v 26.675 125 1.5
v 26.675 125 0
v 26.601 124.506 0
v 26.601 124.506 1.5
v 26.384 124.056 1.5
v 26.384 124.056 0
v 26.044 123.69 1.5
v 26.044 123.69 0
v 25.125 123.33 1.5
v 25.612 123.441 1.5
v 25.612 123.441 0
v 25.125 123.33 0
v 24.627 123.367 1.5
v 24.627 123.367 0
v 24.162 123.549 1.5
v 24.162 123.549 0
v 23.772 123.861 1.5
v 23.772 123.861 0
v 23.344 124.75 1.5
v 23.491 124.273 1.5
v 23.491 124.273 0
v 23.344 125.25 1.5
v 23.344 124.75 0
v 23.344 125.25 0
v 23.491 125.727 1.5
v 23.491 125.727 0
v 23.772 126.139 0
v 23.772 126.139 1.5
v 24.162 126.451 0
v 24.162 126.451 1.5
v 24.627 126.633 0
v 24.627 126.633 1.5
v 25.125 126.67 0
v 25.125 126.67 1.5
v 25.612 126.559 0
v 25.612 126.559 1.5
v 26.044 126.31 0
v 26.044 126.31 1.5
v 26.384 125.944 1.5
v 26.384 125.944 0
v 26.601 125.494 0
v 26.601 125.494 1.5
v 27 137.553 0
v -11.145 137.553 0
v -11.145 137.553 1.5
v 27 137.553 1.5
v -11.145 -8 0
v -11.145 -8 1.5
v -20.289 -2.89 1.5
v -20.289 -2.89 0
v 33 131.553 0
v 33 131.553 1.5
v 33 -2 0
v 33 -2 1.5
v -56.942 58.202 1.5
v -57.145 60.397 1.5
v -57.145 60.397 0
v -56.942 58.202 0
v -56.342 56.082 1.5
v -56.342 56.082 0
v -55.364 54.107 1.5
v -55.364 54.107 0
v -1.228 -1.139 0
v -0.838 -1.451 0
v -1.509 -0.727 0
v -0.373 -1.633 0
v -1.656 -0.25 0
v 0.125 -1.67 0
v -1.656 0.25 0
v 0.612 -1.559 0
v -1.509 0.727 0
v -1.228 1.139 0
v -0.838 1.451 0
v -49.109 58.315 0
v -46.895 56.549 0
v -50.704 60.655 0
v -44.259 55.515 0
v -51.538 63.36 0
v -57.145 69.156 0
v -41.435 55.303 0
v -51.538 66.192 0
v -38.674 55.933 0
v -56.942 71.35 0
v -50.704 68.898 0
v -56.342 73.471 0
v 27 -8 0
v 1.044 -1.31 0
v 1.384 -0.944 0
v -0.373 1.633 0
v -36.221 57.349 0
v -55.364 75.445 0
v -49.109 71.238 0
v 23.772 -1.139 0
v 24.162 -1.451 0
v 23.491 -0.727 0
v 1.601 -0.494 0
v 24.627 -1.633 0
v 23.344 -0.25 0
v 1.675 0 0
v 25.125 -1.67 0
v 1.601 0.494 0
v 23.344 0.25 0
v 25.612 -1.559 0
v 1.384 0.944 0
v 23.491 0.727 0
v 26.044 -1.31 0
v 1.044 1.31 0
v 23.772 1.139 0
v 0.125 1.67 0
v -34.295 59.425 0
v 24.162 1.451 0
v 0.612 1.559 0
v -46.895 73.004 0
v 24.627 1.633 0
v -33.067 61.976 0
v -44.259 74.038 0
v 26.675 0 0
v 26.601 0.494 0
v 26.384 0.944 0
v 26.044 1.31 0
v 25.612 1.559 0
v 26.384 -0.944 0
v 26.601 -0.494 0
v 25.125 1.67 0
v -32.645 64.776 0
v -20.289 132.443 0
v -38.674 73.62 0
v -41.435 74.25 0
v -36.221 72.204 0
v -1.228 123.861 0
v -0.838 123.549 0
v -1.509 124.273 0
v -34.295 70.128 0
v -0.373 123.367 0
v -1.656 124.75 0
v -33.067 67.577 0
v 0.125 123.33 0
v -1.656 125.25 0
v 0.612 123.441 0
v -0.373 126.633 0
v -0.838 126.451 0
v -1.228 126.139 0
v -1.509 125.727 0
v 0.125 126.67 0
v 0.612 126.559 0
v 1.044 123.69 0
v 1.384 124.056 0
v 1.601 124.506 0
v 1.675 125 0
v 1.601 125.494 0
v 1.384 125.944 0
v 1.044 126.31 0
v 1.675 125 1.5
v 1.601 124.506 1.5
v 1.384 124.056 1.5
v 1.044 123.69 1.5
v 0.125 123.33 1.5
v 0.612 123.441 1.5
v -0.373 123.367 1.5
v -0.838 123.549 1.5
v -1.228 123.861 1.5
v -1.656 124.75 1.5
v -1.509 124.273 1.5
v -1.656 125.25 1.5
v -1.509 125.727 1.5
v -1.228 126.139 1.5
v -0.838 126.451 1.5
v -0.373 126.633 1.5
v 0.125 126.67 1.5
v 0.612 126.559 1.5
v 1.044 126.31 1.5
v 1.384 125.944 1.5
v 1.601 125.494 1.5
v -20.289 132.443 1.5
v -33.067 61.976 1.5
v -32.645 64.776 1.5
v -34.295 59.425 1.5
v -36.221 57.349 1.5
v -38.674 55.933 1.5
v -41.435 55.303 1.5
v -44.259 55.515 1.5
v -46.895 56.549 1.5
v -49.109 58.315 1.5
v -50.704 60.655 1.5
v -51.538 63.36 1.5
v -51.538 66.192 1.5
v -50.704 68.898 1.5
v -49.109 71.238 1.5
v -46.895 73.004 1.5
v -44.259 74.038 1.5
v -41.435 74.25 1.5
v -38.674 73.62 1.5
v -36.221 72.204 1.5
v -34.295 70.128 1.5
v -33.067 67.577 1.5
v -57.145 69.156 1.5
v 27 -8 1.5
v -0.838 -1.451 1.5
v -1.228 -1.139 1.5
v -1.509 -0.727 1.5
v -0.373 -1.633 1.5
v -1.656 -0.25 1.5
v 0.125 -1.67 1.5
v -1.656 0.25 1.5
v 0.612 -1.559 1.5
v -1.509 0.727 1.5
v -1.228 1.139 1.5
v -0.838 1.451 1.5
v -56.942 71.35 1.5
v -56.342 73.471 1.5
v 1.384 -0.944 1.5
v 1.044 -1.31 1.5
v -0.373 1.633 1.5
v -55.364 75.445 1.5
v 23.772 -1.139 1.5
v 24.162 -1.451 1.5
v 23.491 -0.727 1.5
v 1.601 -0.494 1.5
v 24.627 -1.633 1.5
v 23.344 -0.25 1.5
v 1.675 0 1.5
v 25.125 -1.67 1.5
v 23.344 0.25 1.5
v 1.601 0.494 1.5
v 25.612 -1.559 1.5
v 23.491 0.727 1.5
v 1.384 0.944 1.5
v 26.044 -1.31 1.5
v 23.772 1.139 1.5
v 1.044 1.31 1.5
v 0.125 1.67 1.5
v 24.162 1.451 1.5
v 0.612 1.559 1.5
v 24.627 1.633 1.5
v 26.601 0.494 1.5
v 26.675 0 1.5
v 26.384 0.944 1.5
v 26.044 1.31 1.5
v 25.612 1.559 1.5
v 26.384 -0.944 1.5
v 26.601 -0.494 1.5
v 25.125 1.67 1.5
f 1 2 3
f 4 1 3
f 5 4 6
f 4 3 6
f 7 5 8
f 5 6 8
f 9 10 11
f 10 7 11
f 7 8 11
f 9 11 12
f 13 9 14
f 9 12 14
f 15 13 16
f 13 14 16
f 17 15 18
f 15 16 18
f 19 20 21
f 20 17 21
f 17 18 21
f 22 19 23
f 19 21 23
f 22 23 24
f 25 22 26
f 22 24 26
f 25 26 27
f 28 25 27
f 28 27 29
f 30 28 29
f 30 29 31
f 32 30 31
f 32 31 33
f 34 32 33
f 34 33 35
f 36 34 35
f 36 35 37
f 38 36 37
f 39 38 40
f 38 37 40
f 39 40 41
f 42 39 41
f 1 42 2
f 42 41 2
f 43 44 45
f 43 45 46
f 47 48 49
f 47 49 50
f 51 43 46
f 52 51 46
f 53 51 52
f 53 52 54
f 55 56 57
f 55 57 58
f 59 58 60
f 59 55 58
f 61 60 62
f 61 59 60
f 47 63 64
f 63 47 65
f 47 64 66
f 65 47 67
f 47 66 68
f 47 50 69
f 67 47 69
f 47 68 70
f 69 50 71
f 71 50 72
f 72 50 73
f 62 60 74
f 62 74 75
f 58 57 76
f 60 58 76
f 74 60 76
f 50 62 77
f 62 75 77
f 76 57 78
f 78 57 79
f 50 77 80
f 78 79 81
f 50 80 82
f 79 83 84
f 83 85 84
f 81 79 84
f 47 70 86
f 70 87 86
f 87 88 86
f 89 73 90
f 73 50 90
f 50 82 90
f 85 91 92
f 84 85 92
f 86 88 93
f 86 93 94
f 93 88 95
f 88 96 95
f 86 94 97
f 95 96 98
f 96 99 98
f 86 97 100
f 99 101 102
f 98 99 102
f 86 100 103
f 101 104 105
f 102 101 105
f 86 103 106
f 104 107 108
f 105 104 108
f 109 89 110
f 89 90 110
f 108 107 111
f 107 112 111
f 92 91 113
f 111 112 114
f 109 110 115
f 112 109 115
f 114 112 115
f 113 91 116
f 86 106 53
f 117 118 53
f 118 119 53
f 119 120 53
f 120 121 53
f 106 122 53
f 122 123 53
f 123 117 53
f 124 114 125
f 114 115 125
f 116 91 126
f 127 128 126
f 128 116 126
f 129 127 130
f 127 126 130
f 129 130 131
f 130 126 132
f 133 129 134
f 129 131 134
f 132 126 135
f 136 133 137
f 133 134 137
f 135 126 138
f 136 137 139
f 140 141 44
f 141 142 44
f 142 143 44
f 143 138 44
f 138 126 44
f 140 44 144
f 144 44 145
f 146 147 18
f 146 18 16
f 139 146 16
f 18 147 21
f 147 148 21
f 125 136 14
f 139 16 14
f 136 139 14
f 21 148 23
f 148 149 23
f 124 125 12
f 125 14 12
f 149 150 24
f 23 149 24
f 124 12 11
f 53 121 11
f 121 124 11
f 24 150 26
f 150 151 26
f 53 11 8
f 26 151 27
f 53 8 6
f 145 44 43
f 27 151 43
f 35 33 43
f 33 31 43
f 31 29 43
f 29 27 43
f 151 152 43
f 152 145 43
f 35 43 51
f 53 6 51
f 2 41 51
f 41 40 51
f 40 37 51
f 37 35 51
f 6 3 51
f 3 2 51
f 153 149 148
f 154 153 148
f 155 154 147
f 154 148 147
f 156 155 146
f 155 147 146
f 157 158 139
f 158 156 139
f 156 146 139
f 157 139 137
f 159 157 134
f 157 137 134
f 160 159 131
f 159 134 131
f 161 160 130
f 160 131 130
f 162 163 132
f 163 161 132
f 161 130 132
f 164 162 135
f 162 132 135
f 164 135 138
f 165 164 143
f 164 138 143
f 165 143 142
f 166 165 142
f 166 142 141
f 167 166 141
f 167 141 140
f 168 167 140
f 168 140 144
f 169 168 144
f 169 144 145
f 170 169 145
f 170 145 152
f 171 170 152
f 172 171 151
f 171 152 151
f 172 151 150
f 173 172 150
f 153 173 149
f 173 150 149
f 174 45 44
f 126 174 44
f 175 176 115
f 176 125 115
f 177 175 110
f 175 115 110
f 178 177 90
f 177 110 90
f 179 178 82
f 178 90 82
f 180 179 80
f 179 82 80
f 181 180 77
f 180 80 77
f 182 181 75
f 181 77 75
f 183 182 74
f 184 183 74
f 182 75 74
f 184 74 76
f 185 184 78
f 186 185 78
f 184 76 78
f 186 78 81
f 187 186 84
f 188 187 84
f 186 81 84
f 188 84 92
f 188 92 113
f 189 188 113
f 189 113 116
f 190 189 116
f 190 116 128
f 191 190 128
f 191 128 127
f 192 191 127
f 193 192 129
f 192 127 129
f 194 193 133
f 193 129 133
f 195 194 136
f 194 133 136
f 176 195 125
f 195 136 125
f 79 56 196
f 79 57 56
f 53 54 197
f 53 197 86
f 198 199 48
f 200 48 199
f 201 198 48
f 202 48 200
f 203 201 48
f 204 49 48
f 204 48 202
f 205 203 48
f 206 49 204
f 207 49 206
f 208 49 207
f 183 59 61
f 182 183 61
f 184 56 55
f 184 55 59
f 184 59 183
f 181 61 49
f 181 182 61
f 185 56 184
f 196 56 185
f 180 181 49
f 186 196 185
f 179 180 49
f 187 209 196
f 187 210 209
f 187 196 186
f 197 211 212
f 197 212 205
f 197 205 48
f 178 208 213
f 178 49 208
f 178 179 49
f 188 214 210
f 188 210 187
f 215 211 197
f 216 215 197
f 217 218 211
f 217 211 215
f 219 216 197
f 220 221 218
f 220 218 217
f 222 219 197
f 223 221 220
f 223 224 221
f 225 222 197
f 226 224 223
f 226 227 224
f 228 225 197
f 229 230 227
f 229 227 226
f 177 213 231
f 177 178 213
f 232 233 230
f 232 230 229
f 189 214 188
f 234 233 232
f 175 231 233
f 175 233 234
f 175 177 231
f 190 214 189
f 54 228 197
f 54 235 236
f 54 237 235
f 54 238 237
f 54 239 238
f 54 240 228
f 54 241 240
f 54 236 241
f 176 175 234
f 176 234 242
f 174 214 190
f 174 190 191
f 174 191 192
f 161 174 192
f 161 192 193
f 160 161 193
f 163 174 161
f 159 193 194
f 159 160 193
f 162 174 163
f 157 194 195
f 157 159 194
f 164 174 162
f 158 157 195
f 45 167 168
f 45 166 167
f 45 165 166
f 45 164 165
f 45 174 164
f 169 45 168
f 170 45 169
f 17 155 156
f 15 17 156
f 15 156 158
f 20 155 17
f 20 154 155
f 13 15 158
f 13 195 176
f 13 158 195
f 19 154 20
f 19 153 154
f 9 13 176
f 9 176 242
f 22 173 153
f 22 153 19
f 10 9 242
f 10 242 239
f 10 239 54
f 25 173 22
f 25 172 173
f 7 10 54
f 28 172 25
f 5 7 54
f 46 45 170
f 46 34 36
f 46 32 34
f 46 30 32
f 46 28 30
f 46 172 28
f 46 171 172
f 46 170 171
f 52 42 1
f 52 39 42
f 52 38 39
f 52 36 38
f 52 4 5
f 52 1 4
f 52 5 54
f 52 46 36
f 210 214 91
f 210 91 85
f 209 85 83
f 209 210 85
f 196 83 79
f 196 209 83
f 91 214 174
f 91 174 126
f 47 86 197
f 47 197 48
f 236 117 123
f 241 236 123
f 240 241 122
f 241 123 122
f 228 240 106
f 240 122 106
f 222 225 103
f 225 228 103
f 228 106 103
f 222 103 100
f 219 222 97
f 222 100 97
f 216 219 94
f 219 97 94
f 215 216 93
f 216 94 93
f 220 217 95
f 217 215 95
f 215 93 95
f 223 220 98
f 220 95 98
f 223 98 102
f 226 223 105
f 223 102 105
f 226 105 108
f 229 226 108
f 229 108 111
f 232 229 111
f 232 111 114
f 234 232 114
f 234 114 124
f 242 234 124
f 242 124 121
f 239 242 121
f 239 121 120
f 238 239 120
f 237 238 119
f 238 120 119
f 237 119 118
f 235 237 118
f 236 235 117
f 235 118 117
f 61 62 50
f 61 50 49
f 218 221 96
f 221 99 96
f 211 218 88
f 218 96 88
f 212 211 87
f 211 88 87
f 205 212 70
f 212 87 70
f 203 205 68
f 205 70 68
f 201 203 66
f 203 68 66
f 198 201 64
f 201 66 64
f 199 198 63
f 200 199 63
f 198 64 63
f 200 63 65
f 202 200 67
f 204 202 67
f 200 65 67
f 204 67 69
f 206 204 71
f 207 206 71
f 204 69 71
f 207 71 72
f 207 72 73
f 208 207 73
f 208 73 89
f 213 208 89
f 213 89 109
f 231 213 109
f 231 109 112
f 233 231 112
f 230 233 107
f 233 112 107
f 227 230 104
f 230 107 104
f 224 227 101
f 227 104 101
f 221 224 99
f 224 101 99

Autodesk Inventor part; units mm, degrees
ref_plane "YZ Plane" through (0, 0, 0) normal (1, 0, 0) x (0, 1, 0)
ref_plane "XZ Plane" through (0, 0, 0) normal (0, 1, 0) x (-1, 0, 0)
ref_plane "XY Plane" through (0, 0, 0) normal (0, 0, 1) x (1, 0, 0)
sketch "Sketch1" plane through (0, 0, 0) normal (0, 0, 1) x (1, 0, 0)
  circle A0 centre (0, 0) radius 1.675
  circle A1 centre (25, 0) radius 1.675
  line L0 (0, 0) -> (0, 1.675)
  circle A2 centre (0, 125) radius 1.675
  circle A3 centre (25, 125) radius 1.675
  line L1 (33, -8) -> (-57.1446, -8)
  line L2 (-57.1446, -8) -> (-57.1446, 137.5528)
  line L3 (-57.1446, 137.5528) -> (33, 137.5528)
  line L4 (33, 137.5528) -> (33, -8)
  line L5 (-57.1446, 64.7764) -> (33, 64.7764)
  circle A4 centre (-42.1446, 64.7764) radius 9.5
  point P0 (0, 126.675)
  dimension "d0" = 3.35
  dimension "d1" = 3.35
  dimension "d2" = 25
  dimension "d5" = 125
  dimension "d10" = 8
  dimension "d11" = 8
  dimension "d12" = 12.5528
  dimension "d13" = 19
  dimension "d14" = 15
extrude "Plate1" add sketch "Sketch1" along normal blind 1.5 contours L1 L2 L5 A4 L4 | L5 A4 L2 L3 L4
chamfer "Corner Chamfer1" distance 40 distance2 65 1 edges at (-57.1446, 137.5528, 0.75) measured on face at (2.9518, 137.5528, 0.5)
chamfer "Corner Chamfer2" distance 40 distance2 65 1 edges at (-57.1446, -8, 0.75) measured on face at (-27.0964, -8, 0.5)
fillet "Corner Round1" radius 12 2 edges at (-57.1446, 72.5528, 0.75) (-57.1446, 57, 0.75)
chamfer "Corner Chamfer3" distance 6 angle 45 4 edges at (33, 137.5528, 0.75) (-17.1446, 137.5528, 0.75) (-17.1446, -8, 0.75) (33, -8, 0.75)
equation "\"d0\" = rivet_diameter"
equation "\"d1\" = rivet_diameter"
equation "\"d15\" = Thickness"
equation "\"d5\" = 0.5 * rivet_displacement"
equation "\"Thickness\" = plate_thickness"
equation "\"BendRadius\" = Thickness"
equation "\"BendReliefWidth\" = Thickness"
equation "\"BendReliefDepth\" = 0.5 * Thickness"
equation "\"CornerReliefSize\" = 4 * Thickness"
equation "\"MinimumRemnant\" = 2 * Thickness"
equation "\"TransitionRadius\" = BendRadius"
equation "\"JacobiRadiusSize\" = BendRadius"
equation "\"GapSize\" = Thickness"
equation "\"A_joint_diameter\" = 16"
equation "\"A_B_spacing\" = 2"
equation "\"A_joint_tolerance\" = 3"
equation "\"l___________\" = 0"
equation "\"l__________\" = 0"
equation "\"l_________\" = 0"
equation "\"rivet_diameter\" = 3.35"
equation "\"plate_thickness\" = 1.5"
equation "\"l________\" = 0"
equation "\"L_Piston_Top\" = 25"
equation "\"L_Piston_Bottom\" = 21"
equation "\"rivet_displacement\" = 250"
properties part number "Piston_A_beam_hinge"
